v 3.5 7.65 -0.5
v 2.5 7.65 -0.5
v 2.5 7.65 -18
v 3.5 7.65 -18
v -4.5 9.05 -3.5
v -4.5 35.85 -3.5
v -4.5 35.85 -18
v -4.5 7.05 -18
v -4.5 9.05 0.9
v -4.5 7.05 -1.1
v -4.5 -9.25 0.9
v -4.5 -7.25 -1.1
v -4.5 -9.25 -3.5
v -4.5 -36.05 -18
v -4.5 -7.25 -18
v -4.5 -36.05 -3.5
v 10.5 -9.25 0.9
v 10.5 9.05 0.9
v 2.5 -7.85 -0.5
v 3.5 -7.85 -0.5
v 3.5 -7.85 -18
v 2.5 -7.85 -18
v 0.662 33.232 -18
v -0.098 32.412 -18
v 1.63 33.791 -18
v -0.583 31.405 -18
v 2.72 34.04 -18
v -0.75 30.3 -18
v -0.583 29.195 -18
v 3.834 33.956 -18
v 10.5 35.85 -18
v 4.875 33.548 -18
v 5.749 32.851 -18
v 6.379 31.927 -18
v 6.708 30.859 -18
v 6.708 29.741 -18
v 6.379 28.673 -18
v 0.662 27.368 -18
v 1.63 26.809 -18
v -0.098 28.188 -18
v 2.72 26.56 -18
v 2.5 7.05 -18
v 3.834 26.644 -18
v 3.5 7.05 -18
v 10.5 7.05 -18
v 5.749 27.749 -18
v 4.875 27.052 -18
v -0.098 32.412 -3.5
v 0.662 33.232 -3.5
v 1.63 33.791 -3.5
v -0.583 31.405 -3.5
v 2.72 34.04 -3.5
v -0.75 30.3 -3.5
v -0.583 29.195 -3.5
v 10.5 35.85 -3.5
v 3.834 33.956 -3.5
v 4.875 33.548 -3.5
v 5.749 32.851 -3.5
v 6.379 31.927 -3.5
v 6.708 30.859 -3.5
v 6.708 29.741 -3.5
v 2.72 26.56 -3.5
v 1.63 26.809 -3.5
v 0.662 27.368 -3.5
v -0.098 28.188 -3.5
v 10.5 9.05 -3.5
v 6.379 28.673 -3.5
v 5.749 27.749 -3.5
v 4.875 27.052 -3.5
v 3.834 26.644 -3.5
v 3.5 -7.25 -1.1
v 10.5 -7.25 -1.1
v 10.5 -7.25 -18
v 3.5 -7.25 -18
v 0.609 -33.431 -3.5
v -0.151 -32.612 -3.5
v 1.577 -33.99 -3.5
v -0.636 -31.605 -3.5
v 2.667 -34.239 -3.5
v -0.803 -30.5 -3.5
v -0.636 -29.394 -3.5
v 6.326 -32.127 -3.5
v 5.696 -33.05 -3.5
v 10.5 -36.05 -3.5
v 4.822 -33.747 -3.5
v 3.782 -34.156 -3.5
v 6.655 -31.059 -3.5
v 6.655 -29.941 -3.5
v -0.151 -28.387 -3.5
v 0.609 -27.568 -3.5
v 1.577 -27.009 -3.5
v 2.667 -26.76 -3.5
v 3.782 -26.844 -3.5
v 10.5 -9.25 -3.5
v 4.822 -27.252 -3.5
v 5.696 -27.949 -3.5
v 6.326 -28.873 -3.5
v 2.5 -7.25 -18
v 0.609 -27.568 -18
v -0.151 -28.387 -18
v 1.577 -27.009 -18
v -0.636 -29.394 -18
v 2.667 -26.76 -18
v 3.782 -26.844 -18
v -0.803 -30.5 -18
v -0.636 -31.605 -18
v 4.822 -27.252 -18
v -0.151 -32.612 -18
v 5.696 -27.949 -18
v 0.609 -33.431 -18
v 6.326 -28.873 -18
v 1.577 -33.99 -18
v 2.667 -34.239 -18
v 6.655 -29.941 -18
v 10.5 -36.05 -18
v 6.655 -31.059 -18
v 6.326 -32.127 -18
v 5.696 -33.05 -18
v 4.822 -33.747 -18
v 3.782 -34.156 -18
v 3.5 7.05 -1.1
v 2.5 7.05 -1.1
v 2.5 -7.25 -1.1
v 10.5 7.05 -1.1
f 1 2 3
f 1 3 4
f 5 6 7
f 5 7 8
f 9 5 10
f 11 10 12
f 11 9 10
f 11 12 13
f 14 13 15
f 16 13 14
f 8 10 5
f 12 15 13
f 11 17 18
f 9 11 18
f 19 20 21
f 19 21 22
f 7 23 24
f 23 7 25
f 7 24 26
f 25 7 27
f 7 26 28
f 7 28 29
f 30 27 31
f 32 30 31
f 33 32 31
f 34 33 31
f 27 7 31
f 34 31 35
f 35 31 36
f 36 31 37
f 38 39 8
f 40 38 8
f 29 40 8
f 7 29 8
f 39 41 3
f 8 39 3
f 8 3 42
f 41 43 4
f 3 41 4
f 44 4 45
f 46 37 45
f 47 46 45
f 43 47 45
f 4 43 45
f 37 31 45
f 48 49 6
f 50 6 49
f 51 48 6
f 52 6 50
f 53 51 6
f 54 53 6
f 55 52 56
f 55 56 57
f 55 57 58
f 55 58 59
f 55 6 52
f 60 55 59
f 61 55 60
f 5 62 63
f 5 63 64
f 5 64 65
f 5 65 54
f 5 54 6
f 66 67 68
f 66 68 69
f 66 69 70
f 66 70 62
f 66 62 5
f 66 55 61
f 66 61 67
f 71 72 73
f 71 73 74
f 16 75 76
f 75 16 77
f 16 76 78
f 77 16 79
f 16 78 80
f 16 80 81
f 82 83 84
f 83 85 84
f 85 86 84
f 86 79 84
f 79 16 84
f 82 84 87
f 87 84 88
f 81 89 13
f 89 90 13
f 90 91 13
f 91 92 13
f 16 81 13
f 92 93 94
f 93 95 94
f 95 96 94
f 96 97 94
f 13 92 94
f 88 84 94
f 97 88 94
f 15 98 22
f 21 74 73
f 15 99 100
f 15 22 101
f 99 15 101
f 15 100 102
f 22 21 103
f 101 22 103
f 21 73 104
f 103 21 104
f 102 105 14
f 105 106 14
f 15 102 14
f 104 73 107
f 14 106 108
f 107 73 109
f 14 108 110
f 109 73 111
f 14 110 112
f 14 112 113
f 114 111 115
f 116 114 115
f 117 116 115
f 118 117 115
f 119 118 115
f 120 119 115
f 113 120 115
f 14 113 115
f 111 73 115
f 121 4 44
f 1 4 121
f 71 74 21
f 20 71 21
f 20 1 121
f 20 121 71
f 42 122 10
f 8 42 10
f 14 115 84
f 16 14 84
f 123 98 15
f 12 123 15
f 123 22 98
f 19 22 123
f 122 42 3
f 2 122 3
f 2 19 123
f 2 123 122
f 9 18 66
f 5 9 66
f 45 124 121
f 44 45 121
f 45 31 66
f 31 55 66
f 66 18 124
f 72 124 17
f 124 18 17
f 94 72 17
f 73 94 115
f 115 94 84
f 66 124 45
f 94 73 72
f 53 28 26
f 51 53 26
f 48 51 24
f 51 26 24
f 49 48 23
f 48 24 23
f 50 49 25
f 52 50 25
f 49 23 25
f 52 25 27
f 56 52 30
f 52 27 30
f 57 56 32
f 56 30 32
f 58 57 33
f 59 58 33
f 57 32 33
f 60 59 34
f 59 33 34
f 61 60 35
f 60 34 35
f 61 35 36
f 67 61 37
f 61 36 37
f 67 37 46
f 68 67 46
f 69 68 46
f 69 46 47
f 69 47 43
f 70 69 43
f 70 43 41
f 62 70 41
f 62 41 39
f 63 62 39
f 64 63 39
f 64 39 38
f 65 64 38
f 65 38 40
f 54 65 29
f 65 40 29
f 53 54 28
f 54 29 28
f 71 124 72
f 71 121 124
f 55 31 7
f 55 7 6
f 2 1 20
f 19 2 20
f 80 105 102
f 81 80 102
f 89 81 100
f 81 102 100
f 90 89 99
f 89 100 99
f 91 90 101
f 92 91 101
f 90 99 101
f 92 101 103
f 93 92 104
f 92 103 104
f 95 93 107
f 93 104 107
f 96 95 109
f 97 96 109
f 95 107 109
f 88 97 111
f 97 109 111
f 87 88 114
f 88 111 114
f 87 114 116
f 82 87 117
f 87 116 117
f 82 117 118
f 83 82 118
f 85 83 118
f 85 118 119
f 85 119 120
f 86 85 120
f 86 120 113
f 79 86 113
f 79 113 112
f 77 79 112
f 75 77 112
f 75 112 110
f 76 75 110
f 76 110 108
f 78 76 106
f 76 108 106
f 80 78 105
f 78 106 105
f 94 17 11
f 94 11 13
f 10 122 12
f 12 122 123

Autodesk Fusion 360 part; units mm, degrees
sketch "Sketch Metalens Holder" plane through (0, 0, 0) normal (1, 0, 0) x (0, 0, -1)
  line L0 (0, 8.15) -> (16.5, 8.15)
  line L1 (16.5, 8.15) -> (16.5, -8.35)
  line L2 (16.5, -8.35) -> (0, -8.35)
  line L3 (0, -8.35) -> (0, 8.15)
  dimension "d3" = 16.5
  dimension "d4" = 16.5
extrude "Extrude Metalens Holder" add sketch "Sketch Metalens Holder" along normal blind 6
shell "Shell Metalens Holder" thickness 1.1 removed faces 2 at (6, 2.65, -5.5) at (0, 2.65, -5.5)
sketch "Sketch Screwing Parts" plane through (0, 0, 0) normal (1, 0, 0) x (0, 0, -1)
  line L0 (0, -8.35) -> (16.5, -8.35)
  line L1 (3.5, 8.15) -> (18, 8.15)
  line L2 (18, 8.15) -> (18, 35.85)
  line L3 (18, 35.85) -> (3.5, 35.85)
  line L4 (3.5, 35.85) -> (3.5, 8.15)
  line L5 (3.5, -8.35) -> (18, -8.35)
  line L6 (18, -8.35) -> (18, -36.05)
  line L7 (18, -36.05) -> (3.5, -36.05)
  line L8 (3.5, -36.05) -> (3.5, -8.35)
  line L9 (16.5, -8.35) -> (16.5, 8.15)
  point P0 (0, 8.15)
  dimension "d144" = 3.5
  dimension "d145" = 27.7
  dimension "d148" = 27.7
  dimension "d163" = 1.5
  dimension "d164" = 3.5
extrude "Extrude31" add sketch "Sketch Screwing Parts" along normal blind 6
ref_plane "WorkPlane1" through (3, -0.1, -8.25) normal (-1, 0, 0) x (0, 0, 1)
sketch "Sketch Inside Slit" plane through (3, 0, 0) normal (-1, 0, 0) x (0, 0, 1)
  line L0 (-15.4, 7.05) -> (-15.4, -7.25)
  line L1 (-16, 7.65) -> (-0.5, 7.65)
  line L2 (-0.5, 7.65) -> (-0.5, -7.85)
  line L3 (-0.5, -7.85) -> (-16, -7.85)
  line L4 (-16, -7.85) -> (-16, 7.65)
  line L5 (-15.4, 7.05) -> (-1.1, 7.05)
  line L6 (-1.1, 7.05) -> (-1.1, -7.25)
  line L7 (-1.1, -7.25) -> (-15.4, -7.25)
  line L8 (-15.4, -7.25) -> (-15.4, 7.05)
  line L9 (-15.4, 7.05) -> (-16, 7.05)
  line L10 (-1.1, 7.05) -> (-0.5, 7.05)
  line L11 (-1.1, -7.25) -> (-0.5, -7.25)
  line L12 (-15.4, -7.25) -> (-16, -7.25)
  point P0 (-1.1, -7.25)
  point P1 (-1.1, 7.05)
  dimension "d91" = 15.5
extrude "Extrude Inside Slit" cut sketch "Sketch Inside Slit" along normal mid plane 1 contours L2 L6 L10 L11
extrude "Extrude Inside Slit Bis" cut sketch "Sketch Inside Slit" along normal mid plane 1 contours L1 L2 L4 L5 L9 L10
extrude "Extrude Inside Slit BisBis" cut sketch "Sketch Inside Slit" along normal mid plane 1 contours L0 L4 L8 L9 L12
extrude "Extrude Inside Slit BisBisBis" cut sketch "Sketch Inside Slit" along normal mid plane 1
extrude "Extrude" cut 1 faces at (0.8333, 2.2833, -15.4) along direction (0, 0, -1) blind 1.1
extrude "Extrude22" cut 1 faces at (4.3333, 2.2833, -15.4) along direction (0, 0, -1) blind 1.1
extrude "Extrude23" cut 1 faces at (2.8333, -2.4833, -16) along direction (0, 0, -1) blind 0.5
extrude "Extrude24" add 1 faces at (2, -2.85, 0) along direction (0, 0, 1) blind 0.9
extrude "Extrude25" add 2 faces at (2, 8.15, -2.0333) (2, 8.15, -2.0333) along direction (0, 1, 0) blind 0.9
extrude "Extrude26" add 2 faces at (2, -8.35, -2.0333) (2, -8.35, -2.0333) along direction (0, -1, 0) blind 0.9
extrude "Extrude27" add 1 faces at (6, 26.9167, -8.3333) along direction (1, 0, 0) blind 4.5
extrude "Extrude28" add 1 faces at (0, 26.9167, -8.3333) along direction (-1, 0, 0) blind 4.5
extrude "Extrude29" add 1 faces at (-2.1667, 7.6167, -16.5) along direction (0, 0, -1) blind 1.5
extrude "Extrude30" add 1 faces at (-2.1667, -7.8167, -16.5) along direction (0, 0, -1) blind 1.5
sketch "Sketch11" plane through (0, 0, -18) normal (0, 0, -1) x (-1, 0, 0)
  line L0 (4.5, 35.85) -> (-10.5, 35.85)
  line L1 (-10.5, 35.85) -> (-10.5, 7.05)
  line L2 (-10.5, 7.05) -> (-3.5, 7.05)
  line L3 (-3.5, 7.05) -> (-3.5, 7.65)
  line L4 (-3.5, 7.65) -> (-2.5, 7.65)
  line L5 (-2.5, 7.65) -> (-2.5, 7.05)
  line L6 (4.5, 7.05) -> (4.5, 35.85)
  circle A0 centre (-3, 30.3) radius 3.75
  line L7 (-2.5, 7.05) -> (4.5, 7.05)
  dimension "d154" = 7.5
extrude "Extrude32" cut sketch "Sketch11" against normal blind 14.5 contours A0
sketch "Sketch12" plane through (0, 0, -18) normal (0, 0, -1) x (-1, 0, 0)
  line L0 (-10.5, -7.25) -> (-10.5, -36.05)
  line L1 (-10.5, -36.05) -> (4.5, -36.05)
  line L2 (4.5, -36.05) -> (4.5, -7.25)
  line L3 (4.5, -7.25) -> (-2.5, -7.25)
  line L4 (-2.5, -7.25) -> (-2.5, -7.85)
  line L5 (-2.5, -7.85) -> (-3.5, -7.85)
  line L6 (-3.5, -7.85) -> (-3.5, -7.25)
  line L7 (-3.5, -7.25) -> (-10.5, -7.25)
  circle A0 centre (-2.9472, -30.4996) radius 3.75
  dimension "d159" = 7.5
extrude "Extrude33" cut sketch "Sketch12" against normal blind 14.5 contours A0
